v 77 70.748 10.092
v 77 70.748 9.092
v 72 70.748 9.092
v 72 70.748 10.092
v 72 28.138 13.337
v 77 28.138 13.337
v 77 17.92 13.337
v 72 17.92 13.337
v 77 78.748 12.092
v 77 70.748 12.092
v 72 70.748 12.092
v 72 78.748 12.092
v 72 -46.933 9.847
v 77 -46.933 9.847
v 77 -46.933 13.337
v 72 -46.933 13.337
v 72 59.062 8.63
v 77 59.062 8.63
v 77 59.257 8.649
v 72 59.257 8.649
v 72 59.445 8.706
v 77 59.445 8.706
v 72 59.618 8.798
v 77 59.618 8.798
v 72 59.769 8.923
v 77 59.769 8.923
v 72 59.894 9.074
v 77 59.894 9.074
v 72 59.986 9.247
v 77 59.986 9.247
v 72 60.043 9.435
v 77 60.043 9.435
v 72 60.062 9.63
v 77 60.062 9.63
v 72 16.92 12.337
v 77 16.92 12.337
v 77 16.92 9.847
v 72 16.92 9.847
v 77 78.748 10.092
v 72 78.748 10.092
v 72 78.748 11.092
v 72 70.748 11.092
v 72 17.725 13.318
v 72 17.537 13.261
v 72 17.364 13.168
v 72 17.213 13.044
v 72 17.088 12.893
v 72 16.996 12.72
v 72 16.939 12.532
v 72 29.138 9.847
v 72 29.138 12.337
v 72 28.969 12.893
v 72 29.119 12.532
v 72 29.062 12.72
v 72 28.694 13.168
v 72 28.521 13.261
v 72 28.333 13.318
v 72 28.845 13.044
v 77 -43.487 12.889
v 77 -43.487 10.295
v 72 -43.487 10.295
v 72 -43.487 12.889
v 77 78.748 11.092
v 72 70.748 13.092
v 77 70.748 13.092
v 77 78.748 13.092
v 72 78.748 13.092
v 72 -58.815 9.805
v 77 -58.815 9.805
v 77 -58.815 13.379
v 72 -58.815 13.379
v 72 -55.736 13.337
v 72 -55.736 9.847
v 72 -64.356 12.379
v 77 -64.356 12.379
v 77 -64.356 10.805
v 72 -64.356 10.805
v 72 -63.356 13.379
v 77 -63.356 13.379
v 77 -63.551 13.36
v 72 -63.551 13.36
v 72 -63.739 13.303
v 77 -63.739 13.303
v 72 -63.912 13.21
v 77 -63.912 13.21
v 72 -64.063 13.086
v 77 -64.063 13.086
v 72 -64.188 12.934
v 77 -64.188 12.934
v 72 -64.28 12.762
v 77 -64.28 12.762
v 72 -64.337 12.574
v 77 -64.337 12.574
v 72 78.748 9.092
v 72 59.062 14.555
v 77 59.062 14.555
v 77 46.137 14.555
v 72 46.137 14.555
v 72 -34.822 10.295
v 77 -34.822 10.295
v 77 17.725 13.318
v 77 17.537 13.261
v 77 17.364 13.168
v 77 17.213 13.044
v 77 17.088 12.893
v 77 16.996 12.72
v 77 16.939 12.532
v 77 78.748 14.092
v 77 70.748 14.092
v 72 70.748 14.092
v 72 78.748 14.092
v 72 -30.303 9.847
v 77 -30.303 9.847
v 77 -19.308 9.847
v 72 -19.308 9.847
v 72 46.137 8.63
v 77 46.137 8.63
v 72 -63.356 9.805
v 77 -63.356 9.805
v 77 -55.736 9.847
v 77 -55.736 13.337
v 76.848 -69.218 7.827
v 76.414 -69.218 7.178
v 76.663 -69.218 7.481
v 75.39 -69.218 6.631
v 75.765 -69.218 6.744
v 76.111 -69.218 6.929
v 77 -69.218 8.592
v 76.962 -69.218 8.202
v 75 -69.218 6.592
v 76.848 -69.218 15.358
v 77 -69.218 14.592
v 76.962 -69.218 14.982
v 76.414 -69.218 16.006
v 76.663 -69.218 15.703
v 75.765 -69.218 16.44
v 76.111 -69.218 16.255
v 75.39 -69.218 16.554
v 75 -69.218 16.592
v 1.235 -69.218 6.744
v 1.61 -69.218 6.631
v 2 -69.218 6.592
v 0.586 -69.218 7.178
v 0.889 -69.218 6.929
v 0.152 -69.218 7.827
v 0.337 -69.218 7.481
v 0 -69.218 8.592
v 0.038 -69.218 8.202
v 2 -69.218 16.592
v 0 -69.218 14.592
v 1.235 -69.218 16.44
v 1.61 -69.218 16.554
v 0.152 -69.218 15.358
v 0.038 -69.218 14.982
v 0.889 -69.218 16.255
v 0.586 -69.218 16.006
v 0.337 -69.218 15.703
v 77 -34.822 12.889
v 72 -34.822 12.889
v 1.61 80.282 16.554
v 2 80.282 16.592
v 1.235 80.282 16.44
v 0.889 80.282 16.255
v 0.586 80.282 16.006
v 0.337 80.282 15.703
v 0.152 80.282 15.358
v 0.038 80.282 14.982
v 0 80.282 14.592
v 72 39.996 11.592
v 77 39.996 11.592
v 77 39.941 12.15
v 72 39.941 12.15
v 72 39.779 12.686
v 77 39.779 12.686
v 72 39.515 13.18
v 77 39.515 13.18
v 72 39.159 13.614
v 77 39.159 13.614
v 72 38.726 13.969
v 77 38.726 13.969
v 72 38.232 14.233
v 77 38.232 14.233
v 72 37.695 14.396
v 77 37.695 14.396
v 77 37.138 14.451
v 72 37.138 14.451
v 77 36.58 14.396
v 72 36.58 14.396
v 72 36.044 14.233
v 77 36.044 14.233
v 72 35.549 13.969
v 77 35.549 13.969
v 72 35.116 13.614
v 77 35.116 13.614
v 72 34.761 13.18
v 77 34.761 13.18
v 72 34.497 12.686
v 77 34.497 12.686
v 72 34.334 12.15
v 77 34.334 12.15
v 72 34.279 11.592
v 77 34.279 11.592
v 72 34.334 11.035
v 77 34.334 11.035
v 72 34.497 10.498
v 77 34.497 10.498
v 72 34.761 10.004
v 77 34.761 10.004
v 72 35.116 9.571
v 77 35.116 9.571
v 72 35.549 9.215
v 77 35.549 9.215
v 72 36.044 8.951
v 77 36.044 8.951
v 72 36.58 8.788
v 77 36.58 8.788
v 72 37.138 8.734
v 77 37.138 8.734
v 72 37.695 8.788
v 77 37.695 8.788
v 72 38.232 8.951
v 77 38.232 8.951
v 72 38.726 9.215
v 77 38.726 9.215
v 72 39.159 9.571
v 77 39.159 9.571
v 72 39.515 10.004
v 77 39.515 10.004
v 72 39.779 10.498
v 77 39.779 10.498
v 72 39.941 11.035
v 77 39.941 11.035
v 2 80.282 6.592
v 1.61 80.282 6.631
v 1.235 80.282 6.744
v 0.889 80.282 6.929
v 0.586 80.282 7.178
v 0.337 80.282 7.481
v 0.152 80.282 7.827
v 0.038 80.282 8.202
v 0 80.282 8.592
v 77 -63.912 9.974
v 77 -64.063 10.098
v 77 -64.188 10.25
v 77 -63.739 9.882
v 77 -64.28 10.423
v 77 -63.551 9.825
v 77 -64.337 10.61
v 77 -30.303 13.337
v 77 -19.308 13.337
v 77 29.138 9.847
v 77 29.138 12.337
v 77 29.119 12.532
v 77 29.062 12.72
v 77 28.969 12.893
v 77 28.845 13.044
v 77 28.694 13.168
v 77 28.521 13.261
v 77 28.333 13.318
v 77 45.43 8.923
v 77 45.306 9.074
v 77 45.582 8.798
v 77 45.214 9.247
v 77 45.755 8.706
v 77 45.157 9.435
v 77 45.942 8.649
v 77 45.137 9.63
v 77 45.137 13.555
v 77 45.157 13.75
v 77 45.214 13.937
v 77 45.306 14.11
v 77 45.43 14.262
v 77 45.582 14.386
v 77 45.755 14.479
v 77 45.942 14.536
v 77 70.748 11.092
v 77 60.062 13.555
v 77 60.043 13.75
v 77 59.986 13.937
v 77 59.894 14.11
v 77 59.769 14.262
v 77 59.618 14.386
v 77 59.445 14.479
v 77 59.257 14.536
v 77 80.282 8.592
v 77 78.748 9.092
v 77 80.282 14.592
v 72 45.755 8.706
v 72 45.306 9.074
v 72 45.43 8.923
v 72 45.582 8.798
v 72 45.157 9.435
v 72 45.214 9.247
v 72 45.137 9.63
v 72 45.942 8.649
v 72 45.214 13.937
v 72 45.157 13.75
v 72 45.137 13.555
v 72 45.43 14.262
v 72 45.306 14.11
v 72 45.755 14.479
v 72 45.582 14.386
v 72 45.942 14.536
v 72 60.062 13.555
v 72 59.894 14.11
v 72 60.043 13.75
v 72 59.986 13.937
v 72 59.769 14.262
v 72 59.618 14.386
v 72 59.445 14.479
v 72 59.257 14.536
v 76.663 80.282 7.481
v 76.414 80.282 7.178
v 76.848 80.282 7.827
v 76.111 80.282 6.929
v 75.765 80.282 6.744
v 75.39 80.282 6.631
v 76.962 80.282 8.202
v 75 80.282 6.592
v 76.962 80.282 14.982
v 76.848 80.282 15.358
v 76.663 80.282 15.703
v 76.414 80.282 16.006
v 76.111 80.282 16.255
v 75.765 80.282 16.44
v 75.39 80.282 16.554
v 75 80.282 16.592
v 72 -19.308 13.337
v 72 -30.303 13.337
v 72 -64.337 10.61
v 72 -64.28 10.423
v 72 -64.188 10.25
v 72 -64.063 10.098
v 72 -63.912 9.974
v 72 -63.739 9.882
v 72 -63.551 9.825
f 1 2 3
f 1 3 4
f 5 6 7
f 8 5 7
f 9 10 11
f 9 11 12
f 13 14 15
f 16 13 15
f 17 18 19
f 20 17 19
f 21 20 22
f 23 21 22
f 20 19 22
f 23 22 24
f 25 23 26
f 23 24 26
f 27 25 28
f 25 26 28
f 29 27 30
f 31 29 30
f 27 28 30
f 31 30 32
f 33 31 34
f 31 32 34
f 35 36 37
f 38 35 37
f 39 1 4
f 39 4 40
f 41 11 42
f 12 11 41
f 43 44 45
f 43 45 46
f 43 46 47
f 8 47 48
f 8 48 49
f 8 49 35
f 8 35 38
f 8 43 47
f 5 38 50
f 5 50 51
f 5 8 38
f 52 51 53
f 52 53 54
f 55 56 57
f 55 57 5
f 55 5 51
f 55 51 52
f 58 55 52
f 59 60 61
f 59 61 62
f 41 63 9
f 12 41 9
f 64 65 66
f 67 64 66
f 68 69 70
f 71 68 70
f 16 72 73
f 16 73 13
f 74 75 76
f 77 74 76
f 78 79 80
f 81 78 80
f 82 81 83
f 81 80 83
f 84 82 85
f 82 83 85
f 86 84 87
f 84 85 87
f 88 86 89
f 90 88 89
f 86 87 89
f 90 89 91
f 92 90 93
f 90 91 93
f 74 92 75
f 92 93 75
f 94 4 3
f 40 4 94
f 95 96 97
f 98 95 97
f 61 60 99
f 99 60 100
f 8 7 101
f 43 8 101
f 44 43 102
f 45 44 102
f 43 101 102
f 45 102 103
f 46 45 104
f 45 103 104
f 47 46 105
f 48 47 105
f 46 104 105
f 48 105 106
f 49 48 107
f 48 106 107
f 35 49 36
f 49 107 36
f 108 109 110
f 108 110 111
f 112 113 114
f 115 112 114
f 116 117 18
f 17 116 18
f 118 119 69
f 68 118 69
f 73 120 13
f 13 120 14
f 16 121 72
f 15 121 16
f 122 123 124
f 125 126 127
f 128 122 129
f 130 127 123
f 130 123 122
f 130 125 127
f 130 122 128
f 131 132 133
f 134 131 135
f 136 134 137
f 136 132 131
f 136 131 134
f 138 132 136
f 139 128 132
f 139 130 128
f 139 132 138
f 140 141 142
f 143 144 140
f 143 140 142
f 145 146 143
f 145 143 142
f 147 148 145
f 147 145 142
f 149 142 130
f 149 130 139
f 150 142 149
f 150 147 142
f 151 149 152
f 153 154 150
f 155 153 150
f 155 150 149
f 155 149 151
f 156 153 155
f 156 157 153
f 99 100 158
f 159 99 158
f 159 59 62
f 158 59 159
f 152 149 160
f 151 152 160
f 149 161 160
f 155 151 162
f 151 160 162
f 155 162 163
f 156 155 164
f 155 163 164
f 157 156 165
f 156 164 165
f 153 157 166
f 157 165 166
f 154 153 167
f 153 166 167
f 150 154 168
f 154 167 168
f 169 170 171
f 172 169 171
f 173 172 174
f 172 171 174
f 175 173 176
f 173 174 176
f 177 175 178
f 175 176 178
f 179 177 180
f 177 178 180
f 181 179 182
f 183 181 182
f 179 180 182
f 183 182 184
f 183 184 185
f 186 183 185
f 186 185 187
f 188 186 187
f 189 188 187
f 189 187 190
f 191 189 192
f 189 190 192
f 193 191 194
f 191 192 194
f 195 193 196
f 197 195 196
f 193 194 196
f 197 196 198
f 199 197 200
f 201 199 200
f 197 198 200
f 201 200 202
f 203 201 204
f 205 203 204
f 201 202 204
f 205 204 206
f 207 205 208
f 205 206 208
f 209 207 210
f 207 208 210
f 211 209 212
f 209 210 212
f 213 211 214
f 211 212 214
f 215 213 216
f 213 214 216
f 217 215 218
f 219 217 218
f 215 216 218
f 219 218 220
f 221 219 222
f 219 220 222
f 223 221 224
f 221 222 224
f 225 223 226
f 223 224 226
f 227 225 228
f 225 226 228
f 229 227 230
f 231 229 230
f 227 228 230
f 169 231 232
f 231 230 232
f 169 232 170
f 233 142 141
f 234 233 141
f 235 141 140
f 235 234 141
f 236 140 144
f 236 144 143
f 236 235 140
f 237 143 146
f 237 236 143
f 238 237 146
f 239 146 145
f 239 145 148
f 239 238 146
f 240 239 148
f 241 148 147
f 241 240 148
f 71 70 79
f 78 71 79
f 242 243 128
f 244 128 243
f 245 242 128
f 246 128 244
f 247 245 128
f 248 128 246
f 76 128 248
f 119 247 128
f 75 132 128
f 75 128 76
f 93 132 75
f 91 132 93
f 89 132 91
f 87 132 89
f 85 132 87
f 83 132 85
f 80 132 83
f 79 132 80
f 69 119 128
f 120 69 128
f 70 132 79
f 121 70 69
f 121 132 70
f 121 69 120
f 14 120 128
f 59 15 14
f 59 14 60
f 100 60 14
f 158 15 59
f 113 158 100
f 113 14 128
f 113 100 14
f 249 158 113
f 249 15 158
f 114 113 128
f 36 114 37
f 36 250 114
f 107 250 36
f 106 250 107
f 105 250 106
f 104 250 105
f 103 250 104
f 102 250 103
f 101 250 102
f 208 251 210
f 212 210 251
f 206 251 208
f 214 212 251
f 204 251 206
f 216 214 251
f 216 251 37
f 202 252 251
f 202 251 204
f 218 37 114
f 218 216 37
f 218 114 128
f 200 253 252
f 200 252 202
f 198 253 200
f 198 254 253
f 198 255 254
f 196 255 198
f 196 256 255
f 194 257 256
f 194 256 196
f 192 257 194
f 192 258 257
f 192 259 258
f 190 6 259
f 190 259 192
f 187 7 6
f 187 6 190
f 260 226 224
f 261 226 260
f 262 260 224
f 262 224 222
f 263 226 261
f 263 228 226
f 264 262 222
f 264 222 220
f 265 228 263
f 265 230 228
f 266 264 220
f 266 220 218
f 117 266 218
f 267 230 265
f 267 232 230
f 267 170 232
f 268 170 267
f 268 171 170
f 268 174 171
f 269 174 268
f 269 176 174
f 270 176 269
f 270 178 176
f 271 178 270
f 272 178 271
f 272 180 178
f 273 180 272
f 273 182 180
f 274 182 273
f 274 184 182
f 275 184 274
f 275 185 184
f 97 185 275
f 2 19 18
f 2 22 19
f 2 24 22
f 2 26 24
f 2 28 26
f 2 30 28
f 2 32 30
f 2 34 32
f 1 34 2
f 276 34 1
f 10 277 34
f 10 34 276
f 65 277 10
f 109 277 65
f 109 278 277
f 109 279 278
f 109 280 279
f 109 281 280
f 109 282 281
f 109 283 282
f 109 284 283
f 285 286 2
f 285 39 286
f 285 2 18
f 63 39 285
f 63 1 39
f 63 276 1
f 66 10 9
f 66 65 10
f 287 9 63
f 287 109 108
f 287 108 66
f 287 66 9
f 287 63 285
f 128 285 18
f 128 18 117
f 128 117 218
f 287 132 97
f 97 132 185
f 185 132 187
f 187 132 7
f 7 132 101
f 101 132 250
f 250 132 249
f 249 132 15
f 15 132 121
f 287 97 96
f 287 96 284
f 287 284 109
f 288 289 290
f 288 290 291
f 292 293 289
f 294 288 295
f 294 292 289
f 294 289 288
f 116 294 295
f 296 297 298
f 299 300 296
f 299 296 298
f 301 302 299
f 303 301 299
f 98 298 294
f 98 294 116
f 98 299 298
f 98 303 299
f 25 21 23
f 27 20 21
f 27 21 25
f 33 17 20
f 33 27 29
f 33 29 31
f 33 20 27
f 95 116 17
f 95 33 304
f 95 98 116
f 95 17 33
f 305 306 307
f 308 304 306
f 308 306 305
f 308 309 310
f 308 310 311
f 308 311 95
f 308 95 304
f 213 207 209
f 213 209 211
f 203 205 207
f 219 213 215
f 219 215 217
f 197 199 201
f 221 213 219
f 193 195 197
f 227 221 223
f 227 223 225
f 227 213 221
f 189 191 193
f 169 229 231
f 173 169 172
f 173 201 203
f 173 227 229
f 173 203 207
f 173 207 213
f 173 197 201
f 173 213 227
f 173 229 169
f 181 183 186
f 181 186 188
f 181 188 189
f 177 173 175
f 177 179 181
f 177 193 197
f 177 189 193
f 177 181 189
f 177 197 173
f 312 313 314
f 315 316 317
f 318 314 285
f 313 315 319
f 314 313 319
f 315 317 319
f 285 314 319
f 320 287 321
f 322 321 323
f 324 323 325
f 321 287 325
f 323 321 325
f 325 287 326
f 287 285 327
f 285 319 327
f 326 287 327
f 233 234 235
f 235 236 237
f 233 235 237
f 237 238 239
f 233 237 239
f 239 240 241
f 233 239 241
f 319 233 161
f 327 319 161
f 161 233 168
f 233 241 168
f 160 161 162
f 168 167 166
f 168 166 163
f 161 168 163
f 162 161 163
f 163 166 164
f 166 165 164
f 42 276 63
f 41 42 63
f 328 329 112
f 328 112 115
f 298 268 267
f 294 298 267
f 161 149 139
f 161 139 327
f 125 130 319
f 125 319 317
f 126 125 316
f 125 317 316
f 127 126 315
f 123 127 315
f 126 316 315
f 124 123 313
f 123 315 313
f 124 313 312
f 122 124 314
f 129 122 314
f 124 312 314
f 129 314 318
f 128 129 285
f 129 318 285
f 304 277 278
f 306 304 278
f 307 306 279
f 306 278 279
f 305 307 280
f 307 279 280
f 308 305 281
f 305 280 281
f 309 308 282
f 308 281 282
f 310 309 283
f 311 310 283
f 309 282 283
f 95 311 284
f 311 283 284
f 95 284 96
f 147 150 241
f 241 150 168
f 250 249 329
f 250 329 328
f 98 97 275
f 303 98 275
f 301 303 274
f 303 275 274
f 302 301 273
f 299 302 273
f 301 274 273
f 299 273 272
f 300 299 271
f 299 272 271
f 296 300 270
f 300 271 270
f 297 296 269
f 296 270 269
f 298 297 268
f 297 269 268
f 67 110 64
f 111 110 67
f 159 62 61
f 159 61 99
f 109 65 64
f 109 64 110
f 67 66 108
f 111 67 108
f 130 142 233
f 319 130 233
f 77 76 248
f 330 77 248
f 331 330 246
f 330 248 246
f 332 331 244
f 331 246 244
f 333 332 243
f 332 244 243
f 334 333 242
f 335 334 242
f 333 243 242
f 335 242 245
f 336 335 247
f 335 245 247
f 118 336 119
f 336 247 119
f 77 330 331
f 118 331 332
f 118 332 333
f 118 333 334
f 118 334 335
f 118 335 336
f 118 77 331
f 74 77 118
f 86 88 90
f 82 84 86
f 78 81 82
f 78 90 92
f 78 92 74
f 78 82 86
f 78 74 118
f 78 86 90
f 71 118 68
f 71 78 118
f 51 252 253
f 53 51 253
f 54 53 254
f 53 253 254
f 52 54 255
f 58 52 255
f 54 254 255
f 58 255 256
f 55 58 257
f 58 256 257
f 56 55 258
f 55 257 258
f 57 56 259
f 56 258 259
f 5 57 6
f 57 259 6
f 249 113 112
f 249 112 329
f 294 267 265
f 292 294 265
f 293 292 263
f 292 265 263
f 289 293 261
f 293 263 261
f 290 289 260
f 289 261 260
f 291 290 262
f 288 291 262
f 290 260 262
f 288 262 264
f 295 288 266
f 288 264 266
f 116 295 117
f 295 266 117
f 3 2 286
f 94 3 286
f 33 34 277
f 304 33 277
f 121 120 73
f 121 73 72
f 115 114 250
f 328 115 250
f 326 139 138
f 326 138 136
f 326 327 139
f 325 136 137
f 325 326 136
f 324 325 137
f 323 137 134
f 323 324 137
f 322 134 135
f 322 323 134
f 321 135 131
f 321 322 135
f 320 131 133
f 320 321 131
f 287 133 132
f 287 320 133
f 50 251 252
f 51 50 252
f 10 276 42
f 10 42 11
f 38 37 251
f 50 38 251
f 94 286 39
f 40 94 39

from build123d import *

# Parameters (mm, degrees)
F0_W     = 149.5
F0_H     = 10
F1_DEPTH = 77
F2_W     = 8.803204
F2_H     = 3.489598
F2_W_2   = 8.66519
F2_H_2   = 2.593696
F2_W_3   = 10.99455
F2_W_4   = 8
F2_H_3   = 1
F2_R     = 2.858647
F3_DEPTH = 5
F4_R     = 2


with BuildPart() as f1:
    # F0 (on Right) → F1 (new body)
    with BuildSketch(Plane.YZ):
        with Locations((5.531953, 11.592195)):
            Rectangle(F0_W, F0_H)
    extrude(amount=F1_DEPTH)

    # F2 (on face) → F3 (cut)
    with BuildSketch(Plane.YZ.offset(77)):
        with Locations((-51.334385, 11.592195)):
            Rectangle(F2_W, F2_H)
        with Locations((-39.154455, 11.592195)):
            Rectangle(F2_W_2, F2_H_2)
        with Locations((-24.805639, 11.592195)):
            Rectangle(F2_W_3, F2_H)
        with BuildLine():
            ThreePointArc((29.137943, 12.336994), (28.84505, 13.044101), (28.137943, 13.336994))
            Line((28.137943, 13.336994), (17.9199, 13.336994))
            ThreePointArc((17.9199, 13.336994), (17.212793, 13.044101), (16.9199, 12.336994))
            Line((16.9199, 12.336994), (16.9199, 9.847396))
            Line((16.9199, 9.847396), (29.137943, 9.847396))
            Line((29.137943, 9.847396), (29.137943, 12.336994))
        make_face()
        with BuildLine():
            ThreePointArc((60.062144, 13.554728), (59.769251, 14.261835), (59.062144, 14.554728))
            Line((59.062144, 14.554728), (46.137439, 14.554728))
            ThreePointArc((46.137439, 14.554728), (45.430332, 14.261835), (45.137439, 13.554728))
            Line((45.137439, 13.554728), (45.137439, 9.629662))
            ThreePointArc((45.137439, 9.629662), (45.430332, 8.922555), (46.137439, 8.629662))
            Line((46.137439, 8.629662), (59.062144, 8.629662))
            ThreePointArc((59.062144, 8.629662), (59.769251, 8.922555), (60.062144, 9.629662))
            Line((60.062144, 9.629662), (60.062144, 13.554728))
        make_face()
        with Locations((74.748188, 11.592195)):
            Rectangle(F2_W_4, F2_H_3)
        with Locations((37.137654, 11.592195)):
            Circle(F2_R)
        with Locations((74.748188, 13.592195)):
            Rectangle(F2_W_4, F2_H_3)
        with Locations((74.748188, 9.592195)):
            Rectangle(F2_W_4, F2_H_3)
        with BuildLine():
            Line((-58.815029, 9.805481), (-58.815029, 13.378909))
            Line((-58.815029, 13.378909), (-63.356361, 13.378909))
            ThreePointArc((-63.356361, 13.378909), (-64.063467, 13.086016), (-64.356361, 12.378909))
            Line((-64.356361, 12.378909), (-64.356361, 10.805481))
            ThreePointArc((-64.356361, 10.805481), (-64.063467, 10.098374), (-63.356361, 9.805481))
            Line((-63.356361, 9.805481), (-58.815029, 9.805481))
        make_face()
    extrude(amount=-F3_DEPTH, mode=Mode.SUBTRACT)

    # F4
    f4_edges = [f1.edges().sort_by_distance(p)[0] for p in [
        (77, 5.531953, 16.592195),
        (77, 5.531953, 6.592195),
        (0, 5.531953, 16.592195),
        (0, 5.531953, 6.592195),
    ]]
    fillet(f4_edges, radius=F4_R)


solid = f1.part
